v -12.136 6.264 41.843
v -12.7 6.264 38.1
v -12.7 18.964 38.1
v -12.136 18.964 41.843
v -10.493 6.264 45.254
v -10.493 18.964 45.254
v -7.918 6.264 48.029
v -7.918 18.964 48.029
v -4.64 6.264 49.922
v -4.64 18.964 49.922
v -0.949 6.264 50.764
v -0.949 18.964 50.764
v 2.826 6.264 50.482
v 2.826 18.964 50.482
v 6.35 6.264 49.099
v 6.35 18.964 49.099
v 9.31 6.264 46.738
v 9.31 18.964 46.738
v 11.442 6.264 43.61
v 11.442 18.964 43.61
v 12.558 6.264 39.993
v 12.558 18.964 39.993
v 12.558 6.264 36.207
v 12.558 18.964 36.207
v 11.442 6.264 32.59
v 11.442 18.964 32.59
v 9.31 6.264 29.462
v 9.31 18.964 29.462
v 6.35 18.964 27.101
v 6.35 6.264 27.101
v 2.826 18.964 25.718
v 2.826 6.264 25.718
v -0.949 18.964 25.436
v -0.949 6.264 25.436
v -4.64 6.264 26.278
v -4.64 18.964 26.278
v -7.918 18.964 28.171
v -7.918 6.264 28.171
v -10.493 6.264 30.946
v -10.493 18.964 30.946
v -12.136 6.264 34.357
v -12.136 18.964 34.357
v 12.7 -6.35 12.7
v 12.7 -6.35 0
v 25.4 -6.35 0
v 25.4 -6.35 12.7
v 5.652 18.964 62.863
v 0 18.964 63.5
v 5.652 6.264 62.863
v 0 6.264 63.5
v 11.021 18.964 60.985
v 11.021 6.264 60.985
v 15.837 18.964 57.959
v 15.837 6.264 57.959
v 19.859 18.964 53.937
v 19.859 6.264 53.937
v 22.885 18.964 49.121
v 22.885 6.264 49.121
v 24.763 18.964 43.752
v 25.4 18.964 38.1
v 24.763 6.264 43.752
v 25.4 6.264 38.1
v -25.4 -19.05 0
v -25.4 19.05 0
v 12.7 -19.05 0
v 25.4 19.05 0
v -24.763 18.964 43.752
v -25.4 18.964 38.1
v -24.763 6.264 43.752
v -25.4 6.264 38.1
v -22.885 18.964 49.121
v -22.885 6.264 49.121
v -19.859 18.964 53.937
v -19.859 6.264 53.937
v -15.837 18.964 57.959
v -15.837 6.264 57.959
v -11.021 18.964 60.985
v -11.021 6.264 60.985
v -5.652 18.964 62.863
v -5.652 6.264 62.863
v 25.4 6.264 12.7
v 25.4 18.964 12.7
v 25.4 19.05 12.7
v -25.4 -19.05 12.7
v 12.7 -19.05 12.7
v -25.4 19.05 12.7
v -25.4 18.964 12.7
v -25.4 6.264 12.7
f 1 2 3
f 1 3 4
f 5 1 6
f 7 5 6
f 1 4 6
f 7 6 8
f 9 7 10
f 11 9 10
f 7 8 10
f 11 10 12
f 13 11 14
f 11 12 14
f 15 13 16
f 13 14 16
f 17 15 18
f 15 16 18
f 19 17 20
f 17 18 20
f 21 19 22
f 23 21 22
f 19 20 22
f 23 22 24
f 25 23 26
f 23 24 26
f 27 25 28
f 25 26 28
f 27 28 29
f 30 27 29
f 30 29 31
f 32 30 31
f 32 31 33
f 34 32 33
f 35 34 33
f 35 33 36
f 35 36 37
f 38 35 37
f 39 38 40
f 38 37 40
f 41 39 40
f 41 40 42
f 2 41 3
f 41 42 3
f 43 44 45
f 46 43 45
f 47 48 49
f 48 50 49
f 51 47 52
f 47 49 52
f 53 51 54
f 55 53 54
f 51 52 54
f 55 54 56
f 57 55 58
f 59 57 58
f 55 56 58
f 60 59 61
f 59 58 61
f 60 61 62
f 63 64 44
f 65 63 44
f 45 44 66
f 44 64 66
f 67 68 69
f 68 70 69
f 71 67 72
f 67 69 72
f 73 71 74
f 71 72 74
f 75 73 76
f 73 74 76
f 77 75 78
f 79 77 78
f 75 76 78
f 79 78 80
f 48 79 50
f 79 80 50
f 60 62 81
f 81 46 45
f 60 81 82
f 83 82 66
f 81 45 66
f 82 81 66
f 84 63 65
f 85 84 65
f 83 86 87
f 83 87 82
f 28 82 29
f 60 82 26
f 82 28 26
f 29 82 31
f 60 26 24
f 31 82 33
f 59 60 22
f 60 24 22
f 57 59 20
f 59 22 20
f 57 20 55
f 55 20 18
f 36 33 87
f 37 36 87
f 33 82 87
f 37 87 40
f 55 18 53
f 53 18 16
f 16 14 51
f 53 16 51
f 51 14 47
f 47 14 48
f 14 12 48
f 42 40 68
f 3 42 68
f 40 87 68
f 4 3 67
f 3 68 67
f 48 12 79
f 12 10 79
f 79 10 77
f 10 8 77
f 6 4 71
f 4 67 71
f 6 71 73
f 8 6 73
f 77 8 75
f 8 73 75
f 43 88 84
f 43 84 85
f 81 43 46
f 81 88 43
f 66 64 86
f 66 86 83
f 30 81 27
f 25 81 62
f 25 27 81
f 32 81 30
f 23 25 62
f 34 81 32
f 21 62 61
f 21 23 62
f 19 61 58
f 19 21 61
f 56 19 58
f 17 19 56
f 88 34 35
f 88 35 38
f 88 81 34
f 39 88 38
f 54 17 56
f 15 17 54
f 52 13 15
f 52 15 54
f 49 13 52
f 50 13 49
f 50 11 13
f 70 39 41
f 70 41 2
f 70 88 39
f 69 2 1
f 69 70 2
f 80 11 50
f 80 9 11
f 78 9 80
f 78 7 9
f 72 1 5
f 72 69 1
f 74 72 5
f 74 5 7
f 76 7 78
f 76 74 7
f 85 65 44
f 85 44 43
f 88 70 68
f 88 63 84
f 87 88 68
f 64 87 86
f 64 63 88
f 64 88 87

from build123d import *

# Parameters (mm, degrees)
F0_W     = 50.8
F0_H     = 38.1
F1_DEPTH = 12.7
F2_W     = 12.7
F2_H     = 12.7
F3_DEPTH = 12.7
F4_W     = 12.7
F4_H     = 50.8
F5_DEPTH = 50.8
F6_R     = 12.7
F7_DEPTH = 12.7
F8_R     = 25.4
F9_R     = 25.39999


# Not quite as in the source:
# - a fillet or chamfer is up to 0.001 mm smaller than in the source, because OpenCascade refuses the exact size


with BuildPart() as f1:
    # F0 (on Top) → F1 (new body)
    with BuildSketch(Plane.XY):
        Rectangle(F0_W, F0_H)
    extrude(amount=F1_DEPTH)

    # F2 (on face) → F3 (cut)
    with BuildSketch(Plane.XZ.offset(19.05)):
        with Locations((19.05, 6.35)):
            Rectangle(F2_W, F2_H)
    extrude(amount=-F3_DEPTH, mode=Mode.SUBTRACT)

    # F4 (on face) → F5 (join)
    with BuildSketch(Plane(origin=(-25.4, 0, 0), x_dir=(0, -1, 0), z_dir=(-1, 0, 0))):
        with Locations((-12.6142477781, 38.1)):
            Rectangle(F4_W, F4_H)
    extrude(amount=-F5_DEPTH)

    # F6 (on face) → F7 (cut)
    with BuildSketch(Plane(origin=(0, 18.9642477781, 0), x_dir=(-1, 0, 0), z_dir=(0, 1, 0))):
        with Locations((0, 38.1)):
            Circle(F6_R)
    extrude(amount=-F7_DEPTH, mode=Mode.SUBTRACT)

    # F8
    f8_edges = [f1.edges().sort_by_distance(p)[0] for p in [
        (-25.4, 12.614248, 63.5),
    ]]
    fillet(f8_edges, radius=F8_R)

    # F9 (radius 25.4 in the source; OpenCascade refuses exactly that, so slightly less here)
    f9_edges = [f1.edges().sort_by_distance(p)[0] for p in [
        (25.4, 12.614248, 63.5),
    ]]
    fillet(f9_edges, radius=F9_R)


solid = f1.part
